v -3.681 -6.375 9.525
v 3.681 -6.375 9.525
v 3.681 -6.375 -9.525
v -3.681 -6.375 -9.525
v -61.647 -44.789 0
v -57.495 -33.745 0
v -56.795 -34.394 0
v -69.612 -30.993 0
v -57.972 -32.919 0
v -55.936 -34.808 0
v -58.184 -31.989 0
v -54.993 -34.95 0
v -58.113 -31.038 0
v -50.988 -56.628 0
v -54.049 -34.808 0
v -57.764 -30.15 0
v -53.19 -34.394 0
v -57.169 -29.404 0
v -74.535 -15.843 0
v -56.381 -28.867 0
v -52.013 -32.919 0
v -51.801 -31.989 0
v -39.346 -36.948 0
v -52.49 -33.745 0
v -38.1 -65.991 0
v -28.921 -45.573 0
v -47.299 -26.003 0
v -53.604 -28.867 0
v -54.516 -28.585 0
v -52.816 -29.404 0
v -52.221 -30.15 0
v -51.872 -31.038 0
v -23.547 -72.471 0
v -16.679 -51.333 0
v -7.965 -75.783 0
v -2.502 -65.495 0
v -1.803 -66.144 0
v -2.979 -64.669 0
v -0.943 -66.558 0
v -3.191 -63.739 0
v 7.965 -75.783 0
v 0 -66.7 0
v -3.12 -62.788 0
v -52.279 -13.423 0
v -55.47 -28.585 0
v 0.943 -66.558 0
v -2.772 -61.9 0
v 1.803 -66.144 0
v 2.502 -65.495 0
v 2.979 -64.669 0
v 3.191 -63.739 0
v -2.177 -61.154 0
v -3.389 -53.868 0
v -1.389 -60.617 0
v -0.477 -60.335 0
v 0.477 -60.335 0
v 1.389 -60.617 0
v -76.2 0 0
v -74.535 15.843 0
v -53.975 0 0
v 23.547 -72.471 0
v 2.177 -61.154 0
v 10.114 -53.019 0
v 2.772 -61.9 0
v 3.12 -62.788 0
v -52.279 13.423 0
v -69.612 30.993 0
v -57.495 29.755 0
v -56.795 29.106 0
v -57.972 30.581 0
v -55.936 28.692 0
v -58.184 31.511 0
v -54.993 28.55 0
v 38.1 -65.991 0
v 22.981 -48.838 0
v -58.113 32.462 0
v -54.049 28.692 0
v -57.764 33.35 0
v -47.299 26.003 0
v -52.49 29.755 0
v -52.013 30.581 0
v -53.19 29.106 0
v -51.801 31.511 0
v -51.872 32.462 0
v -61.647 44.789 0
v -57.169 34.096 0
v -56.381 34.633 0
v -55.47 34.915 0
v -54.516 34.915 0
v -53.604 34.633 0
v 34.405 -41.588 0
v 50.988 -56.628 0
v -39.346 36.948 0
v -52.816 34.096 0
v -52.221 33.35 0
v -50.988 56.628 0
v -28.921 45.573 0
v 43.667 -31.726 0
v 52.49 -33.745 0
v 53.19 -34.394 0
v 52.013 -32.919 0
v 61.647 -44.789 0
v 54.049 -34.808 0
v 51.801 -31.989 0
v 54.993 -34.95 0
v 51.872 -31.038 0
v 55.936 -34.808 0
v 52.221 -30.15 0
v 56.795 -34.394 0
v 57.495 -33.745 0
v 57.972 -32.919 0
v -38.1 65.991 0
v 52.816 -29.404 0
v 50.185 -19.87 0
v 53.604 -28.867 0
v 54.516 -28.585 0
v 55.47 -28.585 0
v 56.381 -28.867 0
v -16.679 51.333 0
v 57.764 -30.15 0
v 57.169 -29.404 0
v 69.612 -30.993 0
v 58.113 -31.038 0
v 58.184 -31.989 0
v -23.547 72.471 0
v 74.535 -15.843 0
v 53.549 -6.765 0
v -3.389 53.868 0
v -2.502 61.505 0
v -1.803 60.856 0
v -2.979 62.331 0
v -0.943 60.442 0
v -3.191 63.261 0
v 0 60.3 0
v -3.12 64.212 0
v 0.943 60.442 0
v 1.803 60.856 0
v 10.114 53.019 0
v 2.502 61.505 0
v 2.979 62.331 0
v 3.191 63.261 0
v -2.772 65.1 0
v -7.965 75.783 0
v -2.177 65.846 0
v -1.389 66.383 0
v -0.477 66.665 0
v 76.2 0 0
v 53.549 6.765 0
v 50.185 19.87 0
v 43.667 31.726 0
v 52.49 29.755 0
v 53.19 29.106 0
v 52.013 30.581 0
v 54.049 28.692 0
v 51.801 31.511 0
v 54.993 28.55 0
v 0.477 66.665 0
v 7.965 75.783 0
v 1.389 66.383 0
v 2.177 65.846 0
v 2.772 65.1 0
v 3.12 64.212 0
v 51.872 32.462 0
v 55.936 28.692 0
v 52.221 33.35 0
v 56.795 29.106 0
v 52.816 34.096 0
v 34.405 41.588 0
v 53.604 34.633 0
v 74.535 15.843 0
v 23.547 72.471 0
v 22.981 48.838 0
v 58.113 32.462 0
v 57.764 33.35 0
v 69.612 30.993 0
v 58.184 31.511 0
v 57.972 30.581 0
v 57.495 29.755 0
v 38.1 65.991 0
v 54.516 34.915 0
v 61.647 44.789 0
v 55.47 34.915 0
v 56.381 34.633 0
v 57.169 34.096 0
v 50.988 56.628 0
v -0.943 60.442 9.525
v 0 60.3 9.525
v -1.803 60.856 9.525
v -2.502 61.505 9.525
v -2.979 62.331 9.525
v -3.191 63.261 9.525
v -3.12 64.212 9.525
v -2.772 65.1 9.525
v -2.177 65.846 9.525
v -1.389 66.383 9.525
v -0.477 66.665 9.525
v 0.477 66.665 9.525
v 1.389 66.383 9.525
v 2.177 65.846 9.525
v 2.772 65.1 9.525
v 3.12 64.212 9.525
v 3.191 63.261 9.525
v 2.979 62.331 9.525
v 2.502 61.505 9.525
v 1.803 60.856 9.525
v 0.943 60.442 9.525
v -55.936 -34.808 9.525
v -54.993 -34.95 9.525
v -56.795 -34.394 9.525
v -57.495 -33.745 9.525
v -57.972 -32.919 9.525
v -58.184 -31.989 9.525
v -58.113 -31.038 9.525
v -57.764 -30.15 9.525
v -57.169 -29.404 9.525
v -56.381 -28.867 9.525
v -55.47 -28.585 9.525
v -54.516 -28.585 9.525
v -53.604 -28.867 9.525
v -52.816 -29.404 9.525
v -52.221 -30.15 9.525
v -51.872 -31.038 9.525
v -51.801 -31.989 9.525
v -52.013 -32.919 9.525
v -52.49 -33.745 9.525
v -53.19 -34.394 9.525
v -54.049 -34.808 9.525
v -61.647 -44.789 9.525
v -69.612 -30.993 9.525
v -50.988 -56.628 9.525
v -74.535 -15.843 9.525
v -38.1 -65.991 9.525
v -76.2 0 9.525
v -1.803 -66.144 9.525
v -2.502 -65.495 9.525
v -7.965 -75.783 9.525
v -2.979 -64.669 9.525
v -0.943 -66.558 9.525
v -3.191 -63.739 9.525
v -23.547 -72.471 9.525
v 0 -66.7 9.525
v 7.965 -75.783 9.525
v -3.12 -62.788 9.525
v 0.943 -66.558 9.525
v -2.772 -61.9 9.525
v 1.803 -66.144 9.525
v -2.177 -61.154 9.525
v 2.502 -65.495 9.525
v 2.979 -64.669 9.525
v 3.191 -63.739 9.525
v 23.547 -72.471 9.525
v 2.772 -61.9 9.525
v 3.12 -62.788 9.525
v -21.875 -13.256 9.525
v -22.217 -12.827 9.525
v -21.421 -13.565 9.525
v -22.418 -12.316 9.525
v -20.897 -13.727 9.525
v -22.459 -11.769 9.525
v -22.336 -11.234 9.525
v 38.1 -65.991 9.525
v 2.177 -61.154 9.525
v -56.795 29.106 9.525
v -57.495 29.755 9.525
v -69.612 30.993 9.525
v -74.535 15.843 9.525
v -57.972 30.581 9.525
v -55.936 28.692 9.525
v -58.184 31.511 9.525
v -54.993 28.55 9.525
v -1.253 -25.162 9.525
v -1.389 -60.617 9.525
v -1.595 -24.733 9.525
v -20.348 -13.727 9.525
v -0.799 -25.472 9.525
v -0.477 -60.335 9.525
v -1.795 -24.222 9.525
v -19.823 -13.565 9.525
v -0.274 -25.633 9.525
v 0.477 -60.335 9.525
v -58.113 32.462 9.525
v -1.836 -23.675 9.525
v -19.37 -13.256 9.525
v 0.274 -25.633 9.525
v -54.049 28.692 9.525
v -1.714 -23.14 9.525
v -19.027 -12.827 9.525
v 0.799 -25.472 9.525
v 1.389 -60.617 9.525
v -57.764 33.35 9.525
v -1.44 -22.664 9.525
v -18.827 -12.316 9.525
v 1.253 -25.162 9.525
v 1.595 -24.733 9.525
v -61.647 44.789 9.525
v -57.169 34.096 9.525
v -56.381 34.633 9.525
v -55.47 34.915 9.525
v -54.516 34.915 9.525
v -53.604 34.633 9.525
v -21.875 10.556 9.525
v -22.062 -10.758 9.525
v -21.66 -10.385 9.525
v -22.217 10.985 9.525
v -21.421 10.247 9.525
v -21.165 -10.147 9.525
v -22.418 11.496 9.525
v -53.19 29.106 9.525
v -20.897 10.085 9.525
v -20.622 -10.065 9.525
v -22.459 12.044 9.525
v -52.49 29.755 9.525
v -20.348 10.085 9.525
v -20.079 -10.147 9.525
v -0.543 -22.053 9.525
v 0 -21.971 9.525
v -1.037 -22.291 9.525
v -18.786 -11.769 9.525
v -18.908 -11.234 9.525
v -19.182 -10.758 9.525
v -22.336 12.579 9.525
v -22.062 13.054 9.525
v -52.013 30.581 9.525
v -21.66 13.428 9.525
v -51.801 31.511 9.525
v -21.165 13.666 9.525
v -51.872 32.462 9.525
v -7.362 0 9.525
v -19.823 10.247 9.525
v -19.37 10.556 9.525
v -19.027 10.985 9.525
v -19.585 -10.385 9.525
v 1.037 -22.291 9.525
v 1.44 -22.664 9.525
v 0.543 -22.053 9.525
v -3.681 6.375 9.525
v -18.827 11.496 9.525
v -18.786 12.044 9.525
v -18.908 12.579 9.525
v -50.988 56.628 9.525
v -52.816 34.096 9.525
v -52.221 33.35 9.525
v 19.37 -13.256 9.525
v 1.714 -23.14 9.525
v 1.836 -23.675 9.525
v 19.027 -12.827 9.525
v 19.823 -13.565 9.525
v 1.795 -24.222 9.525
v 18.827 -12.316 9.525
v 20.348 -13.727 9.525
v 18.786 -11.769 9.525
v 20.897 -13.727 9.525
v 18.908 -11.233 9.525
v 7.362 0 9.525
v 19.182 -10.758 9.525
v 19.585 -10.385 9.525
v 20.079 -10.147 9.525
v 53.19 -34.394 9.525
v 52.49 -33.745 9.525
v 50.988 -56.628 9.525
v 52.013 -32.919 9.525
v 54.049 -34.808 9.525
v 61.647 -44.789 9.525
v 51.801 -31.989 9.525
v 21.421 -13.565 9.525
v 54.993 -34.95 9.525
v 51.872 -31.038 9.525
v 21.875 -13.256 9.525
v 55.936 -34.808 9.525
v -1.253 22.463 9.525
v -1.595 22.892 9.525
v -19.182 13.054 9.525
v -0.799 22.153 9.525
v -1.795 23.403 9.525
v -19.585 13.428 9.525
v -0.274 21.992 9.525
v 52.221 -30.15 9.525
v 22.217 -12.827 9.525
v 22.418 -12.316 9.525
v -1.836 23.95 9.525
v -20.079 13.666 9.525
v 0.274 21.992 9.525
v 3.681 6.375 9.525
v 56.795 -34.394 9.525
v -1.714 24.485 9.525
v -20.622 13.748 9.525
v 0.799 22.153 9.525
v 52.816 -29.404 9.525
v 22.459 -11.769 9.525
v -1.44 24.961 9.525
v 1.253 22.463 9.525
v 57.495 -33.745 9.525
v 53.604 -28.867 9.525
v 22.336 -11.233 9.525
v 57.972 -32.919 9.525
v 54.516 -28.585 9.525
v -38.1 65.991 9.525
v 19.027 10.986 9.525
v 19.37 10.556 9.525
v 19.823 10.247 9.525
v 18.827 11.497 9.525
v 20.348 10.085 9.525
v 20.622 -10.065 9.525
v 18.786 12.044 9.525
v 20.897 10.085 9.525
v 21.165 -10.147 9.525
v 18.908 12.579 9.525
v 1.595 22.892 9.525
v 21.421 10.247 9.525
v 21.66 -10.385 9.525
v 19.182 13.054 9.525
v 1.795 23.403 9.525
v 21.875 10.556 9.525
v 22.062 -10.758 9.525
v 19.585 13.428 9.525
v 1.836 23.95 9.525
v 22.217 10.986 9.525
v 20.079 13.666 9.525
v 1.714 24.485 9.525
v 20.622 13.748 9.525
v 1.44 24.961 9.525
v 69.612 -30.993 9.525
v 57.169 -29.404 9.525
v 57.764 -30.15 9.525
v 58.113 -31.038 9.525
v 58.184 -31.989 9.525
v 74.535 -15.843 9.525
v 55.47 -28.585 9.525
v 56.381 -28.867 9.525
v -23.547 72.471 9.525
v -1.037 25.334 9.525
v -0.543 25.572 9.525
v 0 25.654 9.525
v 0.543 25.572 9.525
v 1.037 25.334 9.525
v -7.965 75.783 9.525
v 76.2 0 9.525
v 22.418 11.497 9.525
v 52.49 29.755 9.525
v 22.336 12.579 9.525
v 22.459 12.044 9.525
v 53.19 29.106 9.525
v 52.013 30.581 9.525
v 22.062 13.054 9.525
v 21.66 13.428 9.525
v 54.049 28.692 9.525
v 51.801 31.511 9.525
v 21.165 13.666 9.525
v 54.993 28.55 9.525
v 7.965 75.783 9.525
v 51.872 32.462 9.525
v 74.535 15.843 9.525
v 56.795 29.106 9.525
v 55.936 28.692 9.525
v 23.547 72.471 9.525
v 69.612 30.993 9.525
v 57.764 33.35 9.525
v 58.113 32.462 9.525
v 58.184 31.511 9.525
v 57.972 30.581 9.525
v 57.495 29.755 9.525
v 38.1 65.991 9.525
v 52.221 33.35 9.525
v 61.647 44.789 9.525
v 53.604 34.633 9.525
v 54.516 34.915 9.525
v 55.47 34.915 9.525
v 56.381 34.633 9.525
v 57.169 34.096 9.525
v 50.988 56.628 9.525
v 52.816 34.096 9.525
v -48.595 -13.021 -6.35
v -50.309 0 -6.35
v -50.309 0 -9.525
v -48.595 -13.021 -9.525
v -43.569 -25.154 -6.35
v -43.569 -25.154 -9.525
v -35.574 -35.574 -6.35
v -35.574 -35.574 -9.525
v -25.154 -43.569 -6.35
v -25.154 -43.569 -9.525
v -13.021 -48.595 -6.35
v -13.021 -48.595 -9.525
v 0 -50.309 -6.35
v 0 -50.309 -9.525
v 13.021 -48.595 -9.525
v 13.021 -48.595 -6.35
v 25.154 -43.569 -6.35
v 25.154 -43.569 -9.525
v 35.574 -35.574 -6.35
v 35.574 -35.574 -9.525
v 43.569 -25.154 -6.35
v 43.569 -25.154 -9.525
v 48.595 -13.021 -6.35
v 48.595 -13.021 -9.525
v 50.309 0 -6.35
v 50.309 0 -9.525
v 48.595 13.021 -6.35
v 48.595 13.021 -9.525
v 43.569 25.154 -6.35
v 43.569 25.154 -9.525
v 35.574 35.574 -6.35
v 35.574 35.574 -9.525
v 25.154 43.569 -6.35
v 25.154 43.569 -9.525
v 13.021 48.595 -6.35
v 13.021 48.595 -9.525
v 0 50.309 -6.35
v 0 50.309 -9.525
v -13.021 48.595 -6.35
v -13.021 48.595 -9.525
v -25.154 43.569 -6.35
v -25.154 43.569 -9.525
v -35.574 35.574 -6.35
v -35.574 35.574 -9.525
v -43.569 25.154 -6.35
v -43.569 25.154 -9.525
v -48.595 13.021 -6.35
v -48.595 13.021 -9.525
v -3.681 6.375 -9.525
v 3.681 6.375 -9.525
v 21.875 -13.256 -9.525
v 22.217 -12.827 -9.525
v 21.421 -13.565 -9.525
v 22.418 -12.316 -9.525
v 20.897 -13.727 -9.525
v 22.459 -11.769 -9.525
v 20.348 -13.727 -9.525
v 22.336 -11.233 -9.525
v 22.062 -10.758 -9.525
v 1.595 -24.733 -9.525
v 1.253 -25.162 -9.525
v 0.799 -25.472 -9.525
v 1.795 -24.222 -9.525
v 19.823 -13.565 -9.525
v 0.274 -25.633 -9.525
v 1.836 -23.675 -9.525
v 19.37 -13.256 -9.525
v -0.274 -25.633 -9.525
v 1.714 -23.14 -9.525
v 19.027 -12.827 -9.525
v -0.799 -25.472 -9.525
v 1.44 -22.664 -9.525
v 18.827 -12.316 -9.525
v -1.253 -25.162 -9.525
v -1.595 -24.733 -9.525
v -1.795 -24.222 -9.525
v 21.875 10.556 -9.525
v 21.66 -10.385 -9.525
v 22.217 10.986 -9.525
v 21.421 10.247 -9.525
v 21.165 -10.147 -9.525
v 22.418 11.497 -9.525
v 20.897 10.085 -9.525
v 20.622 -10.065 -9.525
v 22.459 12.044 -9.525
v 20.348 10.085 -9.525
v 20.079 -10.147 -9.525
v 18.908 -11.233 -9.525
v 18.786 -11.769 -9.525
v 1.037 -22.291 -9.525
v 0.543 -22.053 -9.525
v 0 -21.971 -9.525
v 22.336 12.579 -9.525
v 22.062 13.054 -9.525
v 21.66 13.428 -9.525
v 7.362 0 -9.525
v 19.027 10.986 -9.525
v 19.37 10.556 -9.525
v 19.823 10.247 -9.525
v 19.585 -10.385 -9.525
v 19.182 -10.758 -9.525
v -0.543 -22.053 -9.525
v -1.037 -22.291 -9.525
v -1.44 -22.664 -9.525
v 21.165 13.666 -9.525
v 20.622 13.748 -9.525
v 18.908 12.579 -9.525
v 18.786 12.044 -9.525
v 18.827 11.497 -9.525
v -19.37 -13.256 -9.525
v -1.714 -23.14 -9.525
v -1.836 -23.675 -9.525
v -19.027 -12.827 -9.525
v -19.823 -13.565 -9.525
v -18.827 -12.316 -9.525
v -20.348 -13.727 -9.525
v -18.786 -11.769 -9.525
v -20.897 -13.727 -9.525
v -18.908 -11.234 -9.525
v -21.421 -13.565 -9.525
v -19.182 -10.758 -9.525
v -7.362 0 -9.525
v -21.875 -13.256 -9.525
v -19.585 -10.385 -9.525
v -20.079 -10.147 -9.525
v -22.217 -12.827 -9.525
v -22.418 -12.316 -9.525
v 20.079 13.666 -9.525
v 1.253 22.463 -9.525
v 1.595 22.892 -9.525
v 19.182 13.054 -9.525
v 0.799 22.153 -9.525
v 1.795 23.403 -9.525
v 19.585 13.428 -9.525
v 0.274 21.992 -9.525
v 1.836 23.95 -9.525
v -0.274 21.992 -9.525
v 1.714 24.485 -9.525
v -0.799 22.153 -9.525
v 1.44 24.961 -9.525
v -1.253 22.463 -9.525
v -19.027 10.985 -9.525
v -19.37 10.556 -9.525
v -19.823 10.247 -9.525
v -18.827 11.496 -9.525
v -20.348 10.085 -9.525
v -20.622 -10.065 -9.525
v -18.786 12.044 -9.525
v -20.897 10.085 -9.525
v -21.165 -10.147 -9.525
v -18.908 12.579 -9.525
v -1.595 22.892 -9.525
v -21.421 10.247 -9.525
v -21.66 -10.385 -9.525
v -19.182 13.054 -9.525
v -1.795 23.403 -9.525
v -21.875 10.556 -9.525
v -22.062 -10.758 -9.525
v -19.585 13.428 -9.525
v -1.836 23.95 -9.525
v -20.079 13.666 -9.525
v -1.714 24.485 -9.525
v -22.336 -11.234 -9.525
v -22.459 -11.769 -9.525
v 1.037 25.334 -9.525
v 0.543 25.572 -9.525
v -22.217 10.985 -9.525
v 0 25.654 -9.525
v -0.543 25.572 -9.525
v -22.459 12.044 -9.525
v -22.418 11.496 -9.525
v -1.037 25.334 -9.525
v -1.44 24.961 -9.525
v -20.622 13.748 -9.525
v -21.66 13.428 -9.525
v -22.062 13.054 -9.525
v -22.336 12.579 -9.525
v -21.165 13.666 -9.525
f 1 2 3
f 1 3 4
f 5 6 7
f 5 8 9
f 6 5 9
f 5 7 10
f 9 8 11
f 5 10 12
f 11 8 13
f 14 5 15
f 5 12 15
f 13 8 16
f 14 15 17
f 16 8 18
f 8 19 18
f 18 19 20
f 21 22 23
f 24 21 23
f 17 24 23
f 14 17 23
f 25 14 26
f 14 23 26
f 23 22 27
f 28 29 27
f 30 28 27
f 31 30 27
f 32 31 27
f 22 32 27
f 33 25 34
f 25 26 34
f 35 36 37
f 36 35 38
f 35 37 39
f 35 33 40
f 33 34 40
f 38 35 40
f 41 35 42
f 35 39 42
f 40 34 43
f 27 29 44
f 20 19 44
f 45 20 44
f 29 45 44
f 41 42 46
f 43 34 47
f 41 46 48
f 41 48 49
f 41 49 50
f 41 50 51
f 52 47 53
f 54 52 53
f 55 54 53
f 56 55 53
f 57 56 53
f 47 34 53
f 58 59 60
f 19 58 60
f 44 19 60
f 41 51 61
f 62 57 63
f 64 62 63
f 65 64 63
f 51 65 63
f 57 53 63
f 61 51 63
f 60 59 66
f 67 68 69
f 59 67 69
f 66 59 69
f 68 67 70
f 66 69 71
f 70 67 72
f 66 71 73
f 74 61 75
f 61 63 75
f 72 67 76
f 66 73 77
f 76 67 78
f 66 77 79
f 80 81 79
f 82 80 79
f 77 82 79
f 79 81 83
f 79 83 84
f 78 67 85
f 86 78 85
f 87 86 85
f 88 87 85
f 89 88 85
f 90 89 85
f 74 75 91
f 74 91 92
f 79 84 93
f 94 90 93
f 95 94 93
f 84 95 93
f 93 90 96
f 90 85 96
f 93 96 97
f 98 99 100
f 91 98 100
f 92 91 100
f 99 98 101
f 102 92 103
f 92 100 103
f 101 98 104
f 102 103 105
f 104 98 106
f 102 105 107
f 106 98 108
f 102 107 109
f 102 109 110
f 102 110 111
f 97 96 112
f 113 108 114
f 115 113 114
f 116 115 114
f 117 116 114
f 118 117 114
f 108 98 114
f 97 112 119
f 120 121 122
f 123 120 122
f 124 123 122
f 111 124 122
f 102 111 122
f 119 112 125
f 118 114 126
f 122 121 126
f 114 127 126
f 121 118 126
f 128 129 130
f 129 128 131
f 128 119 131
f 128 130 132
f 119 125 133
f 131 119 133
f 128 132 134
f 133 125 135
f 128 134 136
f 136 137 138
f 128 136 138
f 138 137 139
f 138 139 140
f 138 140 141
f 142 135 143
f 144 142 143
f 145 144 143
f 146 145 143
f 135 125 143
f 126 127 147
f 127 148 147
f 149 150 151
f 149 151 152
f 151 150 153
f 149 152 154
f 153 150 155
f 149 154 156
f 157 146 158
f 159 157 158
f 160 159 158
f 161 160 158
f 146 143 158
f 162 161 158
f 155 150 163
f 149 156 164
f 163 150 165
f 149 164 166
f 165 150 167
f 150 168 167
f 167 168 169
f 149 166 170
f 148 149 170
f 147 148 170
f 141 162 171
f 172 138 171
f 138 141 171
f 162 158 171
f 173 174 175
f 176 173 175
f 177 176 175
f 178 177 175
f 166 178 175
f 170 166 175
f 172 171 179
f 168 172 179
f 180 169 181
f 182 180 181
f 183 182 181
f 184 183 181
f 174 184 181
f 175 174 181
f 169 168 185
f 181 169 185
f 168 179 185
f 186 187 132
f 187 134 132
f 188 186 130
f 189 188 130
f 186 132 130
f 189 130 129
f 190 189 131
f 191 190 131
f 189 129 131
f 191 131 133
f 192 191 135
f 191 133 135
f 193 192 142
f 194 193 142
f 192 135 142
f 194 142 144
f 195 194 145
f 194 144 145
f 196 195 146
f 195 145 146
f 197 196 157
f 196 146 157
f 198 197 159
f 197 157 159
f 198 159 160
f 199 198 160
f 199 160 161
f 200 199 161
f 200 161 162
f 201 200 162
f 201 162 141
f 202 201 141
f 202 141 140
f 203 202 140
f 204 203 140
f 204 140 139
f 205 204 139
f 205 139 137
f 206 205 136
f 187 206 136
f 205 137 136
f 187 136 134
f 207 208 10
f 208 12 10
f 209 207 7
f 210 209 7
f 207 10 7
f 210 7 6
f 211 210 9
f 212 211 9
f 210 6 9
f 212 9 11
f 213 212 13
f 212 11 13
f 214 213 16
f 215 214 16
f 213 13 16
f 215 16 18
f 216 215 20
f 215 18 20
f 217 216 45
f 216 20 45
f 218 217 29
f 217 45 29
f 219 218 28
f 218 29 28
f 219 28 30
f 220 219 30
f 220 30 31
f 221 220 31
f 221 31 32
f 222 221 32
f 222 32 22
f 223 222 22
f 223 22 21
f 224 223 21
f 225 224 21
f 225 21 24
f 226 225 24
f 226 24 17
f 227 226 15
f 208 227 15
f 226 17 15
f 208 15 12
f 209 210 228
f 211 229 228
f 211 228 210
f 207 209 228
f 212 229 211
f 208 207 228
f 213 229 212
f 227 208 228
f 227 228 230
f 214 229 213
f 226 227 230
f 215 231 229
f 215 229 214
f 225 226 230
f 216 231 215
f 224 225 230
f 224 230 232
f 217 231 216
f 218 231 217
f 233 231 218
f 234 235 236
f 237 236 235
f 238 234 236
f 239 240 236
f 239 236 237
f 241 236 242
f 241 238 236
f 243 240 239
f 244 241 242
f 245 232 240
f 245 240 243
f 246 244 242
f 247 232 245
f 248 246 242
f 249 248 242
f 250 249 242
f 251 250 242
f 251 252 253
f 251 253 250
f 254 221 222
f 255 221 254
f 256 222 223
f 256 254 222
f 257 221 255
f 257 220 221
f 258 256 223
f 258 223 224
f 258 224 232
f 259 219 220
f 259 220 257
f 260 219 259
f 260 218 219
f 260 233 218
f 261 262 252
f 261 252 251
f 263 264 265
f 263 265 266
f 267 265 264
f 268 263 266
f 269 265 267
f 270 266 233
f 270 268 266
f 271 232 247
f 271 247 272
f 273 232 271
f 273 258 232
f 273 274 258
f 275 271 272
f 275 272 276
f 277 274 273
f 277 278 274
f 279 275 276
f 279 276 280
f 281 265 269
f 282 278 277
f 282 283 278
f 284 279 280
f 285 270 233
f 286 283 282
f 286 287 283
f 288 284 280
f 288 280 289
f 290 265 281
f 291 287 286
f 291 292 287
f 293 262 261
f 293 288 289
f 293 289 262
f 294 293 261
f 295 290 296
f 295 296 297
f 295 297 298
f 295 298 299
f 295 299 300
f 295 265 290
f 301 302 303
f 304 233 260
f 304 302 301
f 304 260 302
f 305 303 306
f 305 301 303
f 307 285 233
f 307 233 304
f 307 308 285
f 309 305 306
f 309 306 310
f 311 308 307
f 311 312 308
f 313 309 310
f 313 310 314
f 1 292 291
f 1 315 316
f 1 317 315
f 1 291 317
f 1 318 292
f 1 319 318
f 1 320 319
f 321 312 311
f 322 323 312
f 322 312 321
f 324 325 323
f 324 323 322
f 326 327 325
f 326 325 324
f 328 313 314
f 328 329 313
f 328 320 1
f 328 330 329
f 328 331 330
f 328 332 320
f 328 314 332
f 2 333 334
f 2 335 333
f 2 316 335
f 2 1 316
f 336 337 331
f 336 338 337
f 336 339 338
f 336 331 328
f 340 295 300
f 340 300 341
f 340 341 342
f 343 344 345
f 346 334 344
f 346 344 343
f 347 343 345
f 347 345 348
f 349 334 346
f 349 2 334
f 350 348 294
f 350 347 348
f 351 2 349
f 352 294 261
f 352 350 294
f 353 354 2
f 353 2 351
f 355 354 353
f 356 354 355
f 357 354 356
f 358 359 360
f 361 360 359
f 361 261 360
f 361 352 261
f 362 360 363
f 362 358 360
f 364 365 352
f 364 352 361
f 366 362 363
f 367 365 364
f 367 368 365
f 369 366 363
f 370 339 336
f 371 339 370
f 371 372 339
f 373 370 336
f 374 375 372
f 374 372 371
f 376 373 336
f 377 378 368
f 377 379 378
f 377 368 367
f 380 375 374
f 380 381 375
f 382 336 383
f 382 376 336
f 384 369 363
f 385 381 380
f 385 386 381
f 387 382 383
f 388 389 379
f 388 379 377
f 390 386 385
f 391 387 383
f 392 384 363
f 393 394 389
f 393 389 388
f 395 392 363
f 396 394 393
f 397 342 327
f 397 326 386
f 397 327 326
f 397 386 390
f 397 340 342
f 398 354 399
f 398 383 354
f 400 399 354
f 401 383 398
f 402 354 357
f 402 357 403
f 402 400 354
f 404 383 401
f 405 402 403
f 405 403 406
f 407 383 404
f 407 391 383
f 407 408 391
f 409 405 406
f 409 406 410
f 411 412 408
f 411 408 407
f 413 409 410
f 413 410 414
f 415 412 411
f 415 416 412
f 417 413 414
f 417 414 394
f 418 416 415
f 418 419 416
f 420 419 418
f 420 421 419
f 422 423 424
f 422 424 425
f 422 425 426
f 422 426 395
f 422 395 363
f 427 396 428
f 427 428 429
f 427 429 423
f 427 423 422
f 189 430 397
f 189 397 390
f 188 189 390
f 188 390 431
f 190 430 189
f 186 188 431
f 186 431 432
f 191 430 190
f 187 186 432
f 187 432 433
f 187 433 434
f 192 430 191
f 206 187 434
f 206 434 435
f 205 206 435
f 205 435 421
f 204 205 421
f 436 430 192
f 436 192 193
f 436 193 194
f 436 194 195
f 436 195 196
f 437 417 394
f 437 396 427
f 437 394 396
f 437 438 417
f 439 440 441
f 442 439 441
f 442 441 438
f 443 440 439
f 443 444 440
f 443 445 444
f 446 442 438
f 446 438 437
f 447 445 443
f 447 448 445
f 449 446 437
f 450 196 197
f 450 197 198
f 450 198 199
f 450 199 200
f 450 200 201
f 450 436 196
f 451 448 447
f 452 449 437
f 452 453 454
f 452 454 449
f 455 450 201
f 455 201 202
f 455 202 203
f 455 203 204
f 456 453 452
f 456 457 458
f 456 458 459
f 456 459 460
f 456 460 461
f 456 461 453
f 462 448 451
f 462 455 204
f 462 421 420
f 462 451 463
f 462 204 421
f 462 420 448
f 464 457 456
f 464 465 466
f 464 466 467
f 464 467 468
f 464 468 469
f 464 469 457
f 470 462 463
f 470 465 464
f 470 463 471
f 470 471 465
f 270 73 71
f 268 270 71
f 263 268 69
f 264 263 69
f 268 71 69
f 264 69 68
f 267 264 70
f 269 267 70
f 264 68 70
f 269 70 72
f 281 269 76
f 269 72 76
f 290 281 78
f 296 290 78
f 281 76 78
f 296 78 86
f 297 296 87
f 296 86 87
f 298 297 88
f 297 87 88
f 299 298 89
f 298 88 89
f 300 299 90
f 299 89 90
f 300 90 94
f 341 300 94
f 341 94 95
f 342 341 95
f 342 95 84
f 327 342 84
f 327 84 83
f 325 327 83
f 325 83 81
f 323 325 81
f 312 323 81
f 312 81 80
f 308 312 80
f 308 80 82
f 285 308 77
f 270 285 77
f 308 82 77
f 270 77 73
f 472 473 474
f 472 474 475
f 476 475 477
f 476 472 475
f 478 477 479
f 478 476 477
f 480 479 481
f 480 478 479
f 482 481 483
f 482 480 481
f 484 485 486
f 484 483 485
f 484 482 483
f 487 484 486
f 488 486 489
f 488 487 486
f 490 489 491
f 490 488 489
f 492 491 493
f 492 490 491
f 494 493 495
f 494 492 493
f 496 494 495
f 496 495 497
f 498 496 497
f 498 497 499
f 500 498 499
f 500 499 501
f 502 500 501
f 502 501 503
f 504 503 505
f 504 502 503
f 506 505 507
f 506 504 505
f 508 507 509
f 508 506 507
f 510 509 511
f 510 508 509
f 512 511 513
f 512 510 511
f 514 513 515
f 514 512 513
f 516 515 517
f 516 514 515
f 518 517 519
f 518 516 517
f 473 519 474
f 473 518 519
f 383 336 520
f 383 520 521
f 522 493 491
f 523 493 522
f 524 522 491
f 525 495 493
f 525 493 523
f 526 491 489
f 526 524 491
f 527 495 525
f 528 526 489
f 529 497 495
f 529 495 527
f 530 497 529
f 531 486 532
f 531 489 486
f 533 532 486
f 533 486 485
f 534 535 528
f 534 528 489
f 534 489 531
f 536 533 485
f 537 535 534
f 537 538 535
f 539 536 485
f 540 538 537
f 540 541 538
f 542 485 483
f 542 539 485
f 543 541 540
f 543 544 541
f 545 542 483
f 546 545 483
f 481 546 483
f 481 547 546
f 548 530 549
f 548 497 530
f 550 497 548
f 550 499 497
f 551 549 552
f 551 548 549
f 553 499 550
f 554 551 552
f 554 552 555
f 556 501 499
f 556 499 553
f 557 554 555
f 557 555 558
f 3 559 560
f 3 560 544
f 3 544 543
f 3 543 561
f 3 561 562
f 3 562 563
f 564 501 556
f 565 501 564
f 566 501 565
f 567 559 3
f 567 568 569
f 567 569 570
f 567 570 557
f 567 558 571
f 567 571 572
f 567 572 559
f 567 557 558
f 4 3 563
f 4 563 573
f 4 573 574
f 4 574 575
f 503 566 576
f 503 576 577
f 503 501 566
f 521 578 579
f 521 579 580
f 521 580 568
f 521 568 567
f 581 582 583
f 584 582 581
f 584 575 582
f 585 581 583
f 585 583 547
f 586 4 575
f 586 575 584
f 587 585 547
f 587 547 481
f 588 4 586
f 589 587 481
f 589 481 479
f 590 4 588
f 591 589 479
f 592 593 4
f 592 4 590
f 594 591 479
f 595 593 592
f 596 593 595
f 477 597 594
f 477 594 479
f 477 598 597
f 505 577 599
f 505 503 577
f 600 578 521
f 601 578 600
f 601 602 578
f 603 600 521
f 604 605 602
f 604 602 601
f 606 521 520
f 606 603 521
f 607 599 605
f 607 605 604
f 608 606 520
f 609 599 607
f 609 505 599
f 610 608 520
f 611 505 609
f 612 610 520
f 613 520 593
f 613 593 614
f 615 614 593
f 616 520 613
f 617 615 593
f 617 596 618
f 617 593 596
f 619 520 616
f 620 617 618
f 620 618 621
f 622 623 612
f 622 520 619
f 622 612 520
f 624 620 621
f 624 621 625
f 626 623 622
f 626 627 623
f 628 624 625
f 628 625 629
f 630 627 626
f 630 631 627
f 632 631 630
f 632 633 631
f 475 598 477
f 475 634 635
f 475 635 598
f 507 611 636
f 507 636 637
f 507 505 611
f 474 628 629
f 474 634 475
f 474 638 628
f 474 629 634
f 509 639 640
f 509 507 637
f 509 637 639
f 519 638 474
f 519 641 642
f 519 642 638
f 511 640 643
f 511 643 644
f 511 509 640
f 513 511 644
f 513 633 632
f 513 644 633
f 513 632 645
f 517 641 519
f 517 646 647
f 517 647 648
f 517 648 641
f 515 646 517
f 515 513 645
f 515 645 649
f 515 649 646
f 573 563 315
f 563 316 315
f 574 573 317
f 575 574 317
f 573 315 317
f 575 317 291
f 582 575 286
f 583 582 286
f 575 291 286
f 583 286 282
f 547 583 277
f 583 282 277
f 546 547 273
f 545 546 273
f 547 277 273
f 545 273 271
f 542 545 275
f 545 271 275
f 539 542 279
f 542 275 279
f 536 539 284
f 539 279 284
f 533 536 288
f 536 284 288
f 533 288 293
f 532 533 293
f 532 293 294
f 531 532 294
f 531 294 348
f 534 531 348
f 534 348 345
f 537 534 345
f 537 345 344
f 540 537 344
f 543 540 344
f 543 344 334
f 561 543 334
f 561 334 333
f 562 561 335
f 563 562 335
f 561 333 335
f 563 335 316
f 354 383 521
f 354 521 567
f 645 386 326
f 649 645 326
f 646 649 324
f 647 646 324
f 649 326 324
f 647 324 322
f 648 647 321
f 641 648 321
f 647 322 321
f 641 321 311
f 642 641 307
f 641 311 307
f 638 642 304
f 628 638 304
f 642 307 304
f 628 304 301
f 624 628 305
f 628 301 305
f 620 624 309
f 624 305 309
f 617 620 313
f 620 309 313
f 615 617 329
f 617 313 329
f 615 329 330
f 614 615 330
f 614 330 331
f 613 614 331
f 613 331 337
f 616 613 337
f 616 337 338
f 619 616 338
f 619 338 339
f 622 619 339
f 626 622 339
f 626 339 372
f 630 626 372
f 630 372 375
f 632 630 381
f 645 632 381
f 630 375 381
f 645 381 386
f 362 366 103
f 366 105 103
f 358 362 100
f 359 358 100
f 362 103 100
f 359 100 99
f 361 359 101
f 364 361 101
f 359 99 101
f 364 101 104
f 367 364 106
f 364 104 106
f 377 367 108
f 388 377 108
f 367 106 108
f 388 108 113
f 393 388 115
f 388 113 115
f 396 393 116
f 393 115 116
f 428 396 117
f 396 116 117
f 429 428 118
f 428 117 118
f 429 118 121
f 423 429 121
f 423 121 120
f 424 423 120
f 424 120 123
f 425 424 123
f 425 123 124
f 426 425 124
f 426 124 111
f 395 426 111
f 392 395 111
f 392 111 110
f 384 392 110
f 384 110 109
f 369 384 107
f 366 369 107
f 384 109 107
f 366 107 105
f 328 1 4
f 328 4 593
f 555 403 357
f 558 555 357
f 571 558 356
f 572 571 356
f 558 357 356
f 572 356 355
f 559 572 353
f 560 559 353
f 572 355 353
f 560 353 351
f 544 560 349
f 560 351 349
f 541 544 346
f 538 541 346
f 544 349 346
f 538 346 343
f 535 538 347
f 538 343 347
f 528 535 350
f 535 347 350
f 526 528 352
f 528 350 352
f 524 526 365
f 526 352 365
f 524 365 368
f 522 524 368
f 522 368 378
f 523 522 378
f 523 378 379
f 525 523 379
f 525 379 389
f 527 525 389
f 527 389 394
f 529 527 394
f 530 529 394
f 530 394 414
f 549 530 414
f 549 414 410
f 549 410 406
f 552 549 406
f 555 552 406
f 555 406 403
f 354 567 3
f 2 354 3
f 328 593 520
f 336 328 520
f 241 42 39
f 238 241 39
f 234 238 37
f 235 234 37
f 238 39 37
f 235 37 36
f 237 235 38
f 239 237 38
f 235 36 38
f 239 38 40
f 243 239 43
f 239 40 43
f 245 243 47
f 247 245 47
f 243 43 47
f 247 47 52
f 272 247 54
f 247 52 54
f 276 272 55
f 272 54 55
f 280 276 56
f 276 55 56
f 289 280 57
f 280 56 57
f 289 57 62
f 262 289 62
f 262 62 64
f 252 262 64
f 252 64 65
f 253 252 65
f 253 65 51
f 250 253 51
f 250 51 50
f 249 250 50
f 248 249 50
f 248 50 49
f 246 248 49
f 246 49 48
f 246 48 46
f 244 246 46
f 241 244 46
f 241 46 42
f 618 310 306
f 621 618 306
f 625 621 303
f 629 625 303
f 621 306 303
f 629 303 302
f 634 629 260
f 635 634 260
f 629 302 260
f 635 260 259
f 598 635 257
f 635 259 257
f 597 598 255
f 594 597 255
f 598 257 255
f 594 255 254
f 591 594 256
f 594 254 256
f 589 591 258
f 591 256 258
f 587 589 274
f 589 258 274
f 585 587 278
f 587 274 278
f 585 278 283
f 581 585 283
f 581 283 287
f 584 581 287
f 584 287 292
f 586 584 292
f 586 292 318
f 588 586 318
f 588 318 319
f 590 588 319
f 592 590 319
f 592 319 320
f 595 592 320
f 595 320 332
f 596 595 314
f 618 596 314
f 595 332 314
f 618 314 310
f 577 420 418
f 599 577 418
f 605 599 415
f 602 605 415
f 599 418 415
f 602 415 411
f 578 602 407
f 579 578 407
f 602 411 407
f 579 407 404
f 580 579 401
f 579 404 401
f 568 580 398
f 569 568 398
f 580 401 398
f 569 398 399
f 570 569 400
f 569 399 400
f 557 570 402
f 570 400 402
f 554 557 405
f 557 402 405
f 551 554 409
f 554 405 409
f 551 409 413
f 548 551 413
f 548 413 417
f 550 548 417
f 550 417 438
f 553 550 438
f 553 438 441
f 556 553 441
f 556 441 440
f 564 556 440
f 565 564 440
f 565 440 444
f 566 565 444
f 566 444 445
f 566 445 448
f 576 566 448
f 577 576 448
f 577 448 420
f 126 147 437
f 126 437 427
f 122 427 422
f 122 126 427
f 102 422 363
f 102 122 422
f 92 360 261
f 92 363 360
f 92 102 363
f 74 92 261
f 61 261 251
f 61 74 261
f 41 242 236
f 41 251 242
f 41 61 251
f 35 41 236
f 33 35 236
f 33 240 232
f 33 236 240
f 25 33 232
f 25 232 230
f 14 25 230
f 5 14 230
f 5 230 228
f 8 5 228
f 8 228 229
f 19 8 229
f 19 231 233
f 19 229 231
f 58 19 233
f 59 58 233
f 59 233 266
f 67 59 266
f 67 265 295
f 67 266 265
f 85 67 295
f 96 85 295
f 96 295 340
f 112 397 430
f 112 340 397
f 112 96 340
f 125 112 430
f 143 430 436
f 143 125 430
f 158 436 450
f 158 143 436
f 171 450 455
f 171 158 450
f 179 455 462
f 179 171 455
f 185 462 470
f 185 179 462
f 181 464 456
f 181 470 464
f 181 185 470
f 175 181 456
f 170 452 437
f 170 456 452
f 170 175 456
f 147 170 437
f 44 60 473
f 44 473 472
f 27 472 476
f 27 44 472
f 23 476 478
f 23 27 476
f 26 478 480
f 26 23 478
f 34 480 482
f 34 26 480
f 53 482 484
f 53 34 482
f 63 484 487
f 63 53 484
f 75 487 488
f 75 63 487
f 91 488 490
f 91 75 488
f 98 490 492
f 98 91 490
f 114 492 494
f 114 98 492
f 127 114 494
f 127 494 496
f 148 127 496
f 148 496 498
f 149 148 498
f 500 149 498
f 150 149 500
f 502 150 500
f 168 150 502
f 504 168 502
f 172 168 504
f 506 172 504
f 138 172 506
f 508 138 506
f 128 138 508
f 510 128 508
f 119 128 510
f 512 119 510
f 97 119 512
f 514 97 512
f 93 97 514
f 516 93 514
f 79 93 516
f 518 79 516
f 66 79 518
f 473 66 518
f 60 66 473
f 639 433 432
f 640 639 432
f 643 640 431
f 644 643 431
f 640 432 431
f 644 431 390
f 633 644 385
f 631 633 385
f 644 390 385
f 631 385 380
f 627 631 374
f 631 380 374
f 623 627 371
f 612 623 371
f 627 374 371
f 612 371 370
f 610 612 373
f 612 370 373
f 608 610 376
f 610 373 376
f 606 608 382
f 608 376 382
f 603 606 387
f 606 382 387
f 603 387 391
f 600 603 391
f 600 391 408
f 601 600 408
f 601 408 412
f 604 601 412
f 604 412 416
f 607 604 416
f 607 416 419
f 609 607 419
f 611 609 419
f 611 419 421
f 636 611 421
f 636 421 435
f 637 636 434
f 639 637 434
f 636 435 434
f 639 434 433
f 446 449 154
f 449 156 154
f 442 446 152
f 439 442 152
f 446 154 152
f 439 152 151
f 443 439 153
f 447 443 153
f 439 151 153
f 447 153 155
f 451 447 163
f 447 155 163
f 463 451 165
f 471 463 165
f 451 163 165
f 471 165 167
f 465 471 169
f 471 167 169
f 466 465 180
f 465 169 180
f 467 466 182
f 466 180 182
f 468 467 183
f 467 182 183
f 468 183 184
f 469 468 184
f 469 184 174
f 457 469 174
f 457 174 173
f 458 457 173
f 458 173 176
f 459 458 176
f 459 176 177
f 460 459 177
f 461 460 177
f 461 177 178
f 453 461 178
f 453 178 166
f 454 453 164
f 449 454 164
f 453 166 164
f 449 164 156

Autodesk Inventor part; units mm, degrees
ref_plane "YZ Plane" through (0, 0, 0) normal (1, 0, 0) x (0, 1, 0)
ref_plane "XZ Plane" through (0, 0, 0) normal (0, 1, 0) x (-1, 0, 0)
ref_plane "XY Plane" through (0, 0, 0) normal (0, 0, 1) x (1, 0, 0)
sketch "Sketch1" plane through (0, 0, 0) normal (0, 0, 1) x (1, 0, 0)
  circle A0 centre (0, 0) radius 76.2
  dimension "d0" = 152.4
extrude "Extrusion1" add sketch "Sketch1" along normal blind 9.525
sketch "Sketch9" plane through (0, 0, 9.525) normal (0, 0, 1) x (1, 0, 0)
  circle A0 centre (0, 0) radius 76.2 projected
  point P0 (0, 63.5)
  point P1 (-54.9926, 31.75)
  point P2 (-54.9926, -31.75)
  point P3 (0, -63.5)
  point P4 (54.9926, -31.75)
  point P5 (54.9926, 31.75)
  dimension "d47" = 63.5
  dimension "d50" = 360
hole "Wheel Mount Holes" at (0, 63.5, 9.525) at (-54.9926, 31.75, 9.525) at (-54.9926, -31.75, 9.525) at (0, -63.5, 9.525) at (54.9926, -31.75, 9.525) at (54.9926, 31.75, 9.525) direction (0, 0, -1) diameter 6.4008 end through all thread size "5/16-18 UNC" class "2B" standard "ANSI Unified Screw Threads"
sketch "Sketch6" plane through (0, 0, 0) normal (0, 0, -1) x (-1, 0, 0)
  circle A0 centre (0, 0) radius 76.2 projected
  circle A1 centre (0, 0) radius 53.975
  dimension "d59" = 107.95
extrude "Extrusion4" add sketch "Sketch6" along normal blind 6.35 draft -30 contours A1
sketch "Sketch10" plane through (0, 0, -6.35) normal (0, 0, -1) x (-1, 0, 0)
  circle A0 centre (0, 0) radius 50.3088 projected
extrude "Extrusion6" add sketch "Sketch10" along normal blind 3.175
sketch "Sketch11" plane through (0, 0, -9.525) normal (0, 0, -1) x (-1, 0, 0)
  circle A0 centre (0, 0) radius 50.3088 projected
  point P0 (0, 23.8125)
  point P1 (-20.6222, 11.9063)
  point P2 (-20.6222, -11.9062)
  point P3 (0, -23.8125)
  point P4 (20.6222, -11.9063)
  point P5 (20.6222, 11.9062)
  dimension "d62" = 23.8125
  dimension "d65" = 360
hole "Sprocket Mount Holes" at (0, 23.8125, -9.525) at (20.6222, 11.9063, -9.525) at (20.6222, -11.9062, -9.525) at (0, -23.8125, -9.525) at (-20.6222, -11.9063, -9.525) at (-20.6222, 11.9062, -9.525) direction (0, 0, 1) diameter 3.683 end through all thread size "10-24 UNC" class "2B" standard "ANSI Unified Screw Threads"
sketch "Sketch12" plane through (0, 0, 9.525) normal (0, 0, 1) x (1, 0, 0)
  circle A0 centre (0, 0) radius 76.2 projected
  line L0 (3.6808, 6.3754) -> (7.3617, 0)
  line L1 (7.3617, 0) -> (3.6808, -6.3754)
  line L2 (3.6808, -6.3754) -> (-3.6808, -6.3754)
  line L3 (-3.6808, -6.3754) -> (-7.3617, 0)
  line L4 (-7.3617, 0) -> (-3.6808, 6.3754)
  line L5 (-3.6808, 6.3754) -> (3.6808, 6.3754)
  point P0 (0, 6.3754)
  dimension "d74" = 12.7508
extrude "Hex Bore" cut sketch "Sketch12" against normal through all contours L0 L1 L2 L3 L4 L5
properties part number "hub"
